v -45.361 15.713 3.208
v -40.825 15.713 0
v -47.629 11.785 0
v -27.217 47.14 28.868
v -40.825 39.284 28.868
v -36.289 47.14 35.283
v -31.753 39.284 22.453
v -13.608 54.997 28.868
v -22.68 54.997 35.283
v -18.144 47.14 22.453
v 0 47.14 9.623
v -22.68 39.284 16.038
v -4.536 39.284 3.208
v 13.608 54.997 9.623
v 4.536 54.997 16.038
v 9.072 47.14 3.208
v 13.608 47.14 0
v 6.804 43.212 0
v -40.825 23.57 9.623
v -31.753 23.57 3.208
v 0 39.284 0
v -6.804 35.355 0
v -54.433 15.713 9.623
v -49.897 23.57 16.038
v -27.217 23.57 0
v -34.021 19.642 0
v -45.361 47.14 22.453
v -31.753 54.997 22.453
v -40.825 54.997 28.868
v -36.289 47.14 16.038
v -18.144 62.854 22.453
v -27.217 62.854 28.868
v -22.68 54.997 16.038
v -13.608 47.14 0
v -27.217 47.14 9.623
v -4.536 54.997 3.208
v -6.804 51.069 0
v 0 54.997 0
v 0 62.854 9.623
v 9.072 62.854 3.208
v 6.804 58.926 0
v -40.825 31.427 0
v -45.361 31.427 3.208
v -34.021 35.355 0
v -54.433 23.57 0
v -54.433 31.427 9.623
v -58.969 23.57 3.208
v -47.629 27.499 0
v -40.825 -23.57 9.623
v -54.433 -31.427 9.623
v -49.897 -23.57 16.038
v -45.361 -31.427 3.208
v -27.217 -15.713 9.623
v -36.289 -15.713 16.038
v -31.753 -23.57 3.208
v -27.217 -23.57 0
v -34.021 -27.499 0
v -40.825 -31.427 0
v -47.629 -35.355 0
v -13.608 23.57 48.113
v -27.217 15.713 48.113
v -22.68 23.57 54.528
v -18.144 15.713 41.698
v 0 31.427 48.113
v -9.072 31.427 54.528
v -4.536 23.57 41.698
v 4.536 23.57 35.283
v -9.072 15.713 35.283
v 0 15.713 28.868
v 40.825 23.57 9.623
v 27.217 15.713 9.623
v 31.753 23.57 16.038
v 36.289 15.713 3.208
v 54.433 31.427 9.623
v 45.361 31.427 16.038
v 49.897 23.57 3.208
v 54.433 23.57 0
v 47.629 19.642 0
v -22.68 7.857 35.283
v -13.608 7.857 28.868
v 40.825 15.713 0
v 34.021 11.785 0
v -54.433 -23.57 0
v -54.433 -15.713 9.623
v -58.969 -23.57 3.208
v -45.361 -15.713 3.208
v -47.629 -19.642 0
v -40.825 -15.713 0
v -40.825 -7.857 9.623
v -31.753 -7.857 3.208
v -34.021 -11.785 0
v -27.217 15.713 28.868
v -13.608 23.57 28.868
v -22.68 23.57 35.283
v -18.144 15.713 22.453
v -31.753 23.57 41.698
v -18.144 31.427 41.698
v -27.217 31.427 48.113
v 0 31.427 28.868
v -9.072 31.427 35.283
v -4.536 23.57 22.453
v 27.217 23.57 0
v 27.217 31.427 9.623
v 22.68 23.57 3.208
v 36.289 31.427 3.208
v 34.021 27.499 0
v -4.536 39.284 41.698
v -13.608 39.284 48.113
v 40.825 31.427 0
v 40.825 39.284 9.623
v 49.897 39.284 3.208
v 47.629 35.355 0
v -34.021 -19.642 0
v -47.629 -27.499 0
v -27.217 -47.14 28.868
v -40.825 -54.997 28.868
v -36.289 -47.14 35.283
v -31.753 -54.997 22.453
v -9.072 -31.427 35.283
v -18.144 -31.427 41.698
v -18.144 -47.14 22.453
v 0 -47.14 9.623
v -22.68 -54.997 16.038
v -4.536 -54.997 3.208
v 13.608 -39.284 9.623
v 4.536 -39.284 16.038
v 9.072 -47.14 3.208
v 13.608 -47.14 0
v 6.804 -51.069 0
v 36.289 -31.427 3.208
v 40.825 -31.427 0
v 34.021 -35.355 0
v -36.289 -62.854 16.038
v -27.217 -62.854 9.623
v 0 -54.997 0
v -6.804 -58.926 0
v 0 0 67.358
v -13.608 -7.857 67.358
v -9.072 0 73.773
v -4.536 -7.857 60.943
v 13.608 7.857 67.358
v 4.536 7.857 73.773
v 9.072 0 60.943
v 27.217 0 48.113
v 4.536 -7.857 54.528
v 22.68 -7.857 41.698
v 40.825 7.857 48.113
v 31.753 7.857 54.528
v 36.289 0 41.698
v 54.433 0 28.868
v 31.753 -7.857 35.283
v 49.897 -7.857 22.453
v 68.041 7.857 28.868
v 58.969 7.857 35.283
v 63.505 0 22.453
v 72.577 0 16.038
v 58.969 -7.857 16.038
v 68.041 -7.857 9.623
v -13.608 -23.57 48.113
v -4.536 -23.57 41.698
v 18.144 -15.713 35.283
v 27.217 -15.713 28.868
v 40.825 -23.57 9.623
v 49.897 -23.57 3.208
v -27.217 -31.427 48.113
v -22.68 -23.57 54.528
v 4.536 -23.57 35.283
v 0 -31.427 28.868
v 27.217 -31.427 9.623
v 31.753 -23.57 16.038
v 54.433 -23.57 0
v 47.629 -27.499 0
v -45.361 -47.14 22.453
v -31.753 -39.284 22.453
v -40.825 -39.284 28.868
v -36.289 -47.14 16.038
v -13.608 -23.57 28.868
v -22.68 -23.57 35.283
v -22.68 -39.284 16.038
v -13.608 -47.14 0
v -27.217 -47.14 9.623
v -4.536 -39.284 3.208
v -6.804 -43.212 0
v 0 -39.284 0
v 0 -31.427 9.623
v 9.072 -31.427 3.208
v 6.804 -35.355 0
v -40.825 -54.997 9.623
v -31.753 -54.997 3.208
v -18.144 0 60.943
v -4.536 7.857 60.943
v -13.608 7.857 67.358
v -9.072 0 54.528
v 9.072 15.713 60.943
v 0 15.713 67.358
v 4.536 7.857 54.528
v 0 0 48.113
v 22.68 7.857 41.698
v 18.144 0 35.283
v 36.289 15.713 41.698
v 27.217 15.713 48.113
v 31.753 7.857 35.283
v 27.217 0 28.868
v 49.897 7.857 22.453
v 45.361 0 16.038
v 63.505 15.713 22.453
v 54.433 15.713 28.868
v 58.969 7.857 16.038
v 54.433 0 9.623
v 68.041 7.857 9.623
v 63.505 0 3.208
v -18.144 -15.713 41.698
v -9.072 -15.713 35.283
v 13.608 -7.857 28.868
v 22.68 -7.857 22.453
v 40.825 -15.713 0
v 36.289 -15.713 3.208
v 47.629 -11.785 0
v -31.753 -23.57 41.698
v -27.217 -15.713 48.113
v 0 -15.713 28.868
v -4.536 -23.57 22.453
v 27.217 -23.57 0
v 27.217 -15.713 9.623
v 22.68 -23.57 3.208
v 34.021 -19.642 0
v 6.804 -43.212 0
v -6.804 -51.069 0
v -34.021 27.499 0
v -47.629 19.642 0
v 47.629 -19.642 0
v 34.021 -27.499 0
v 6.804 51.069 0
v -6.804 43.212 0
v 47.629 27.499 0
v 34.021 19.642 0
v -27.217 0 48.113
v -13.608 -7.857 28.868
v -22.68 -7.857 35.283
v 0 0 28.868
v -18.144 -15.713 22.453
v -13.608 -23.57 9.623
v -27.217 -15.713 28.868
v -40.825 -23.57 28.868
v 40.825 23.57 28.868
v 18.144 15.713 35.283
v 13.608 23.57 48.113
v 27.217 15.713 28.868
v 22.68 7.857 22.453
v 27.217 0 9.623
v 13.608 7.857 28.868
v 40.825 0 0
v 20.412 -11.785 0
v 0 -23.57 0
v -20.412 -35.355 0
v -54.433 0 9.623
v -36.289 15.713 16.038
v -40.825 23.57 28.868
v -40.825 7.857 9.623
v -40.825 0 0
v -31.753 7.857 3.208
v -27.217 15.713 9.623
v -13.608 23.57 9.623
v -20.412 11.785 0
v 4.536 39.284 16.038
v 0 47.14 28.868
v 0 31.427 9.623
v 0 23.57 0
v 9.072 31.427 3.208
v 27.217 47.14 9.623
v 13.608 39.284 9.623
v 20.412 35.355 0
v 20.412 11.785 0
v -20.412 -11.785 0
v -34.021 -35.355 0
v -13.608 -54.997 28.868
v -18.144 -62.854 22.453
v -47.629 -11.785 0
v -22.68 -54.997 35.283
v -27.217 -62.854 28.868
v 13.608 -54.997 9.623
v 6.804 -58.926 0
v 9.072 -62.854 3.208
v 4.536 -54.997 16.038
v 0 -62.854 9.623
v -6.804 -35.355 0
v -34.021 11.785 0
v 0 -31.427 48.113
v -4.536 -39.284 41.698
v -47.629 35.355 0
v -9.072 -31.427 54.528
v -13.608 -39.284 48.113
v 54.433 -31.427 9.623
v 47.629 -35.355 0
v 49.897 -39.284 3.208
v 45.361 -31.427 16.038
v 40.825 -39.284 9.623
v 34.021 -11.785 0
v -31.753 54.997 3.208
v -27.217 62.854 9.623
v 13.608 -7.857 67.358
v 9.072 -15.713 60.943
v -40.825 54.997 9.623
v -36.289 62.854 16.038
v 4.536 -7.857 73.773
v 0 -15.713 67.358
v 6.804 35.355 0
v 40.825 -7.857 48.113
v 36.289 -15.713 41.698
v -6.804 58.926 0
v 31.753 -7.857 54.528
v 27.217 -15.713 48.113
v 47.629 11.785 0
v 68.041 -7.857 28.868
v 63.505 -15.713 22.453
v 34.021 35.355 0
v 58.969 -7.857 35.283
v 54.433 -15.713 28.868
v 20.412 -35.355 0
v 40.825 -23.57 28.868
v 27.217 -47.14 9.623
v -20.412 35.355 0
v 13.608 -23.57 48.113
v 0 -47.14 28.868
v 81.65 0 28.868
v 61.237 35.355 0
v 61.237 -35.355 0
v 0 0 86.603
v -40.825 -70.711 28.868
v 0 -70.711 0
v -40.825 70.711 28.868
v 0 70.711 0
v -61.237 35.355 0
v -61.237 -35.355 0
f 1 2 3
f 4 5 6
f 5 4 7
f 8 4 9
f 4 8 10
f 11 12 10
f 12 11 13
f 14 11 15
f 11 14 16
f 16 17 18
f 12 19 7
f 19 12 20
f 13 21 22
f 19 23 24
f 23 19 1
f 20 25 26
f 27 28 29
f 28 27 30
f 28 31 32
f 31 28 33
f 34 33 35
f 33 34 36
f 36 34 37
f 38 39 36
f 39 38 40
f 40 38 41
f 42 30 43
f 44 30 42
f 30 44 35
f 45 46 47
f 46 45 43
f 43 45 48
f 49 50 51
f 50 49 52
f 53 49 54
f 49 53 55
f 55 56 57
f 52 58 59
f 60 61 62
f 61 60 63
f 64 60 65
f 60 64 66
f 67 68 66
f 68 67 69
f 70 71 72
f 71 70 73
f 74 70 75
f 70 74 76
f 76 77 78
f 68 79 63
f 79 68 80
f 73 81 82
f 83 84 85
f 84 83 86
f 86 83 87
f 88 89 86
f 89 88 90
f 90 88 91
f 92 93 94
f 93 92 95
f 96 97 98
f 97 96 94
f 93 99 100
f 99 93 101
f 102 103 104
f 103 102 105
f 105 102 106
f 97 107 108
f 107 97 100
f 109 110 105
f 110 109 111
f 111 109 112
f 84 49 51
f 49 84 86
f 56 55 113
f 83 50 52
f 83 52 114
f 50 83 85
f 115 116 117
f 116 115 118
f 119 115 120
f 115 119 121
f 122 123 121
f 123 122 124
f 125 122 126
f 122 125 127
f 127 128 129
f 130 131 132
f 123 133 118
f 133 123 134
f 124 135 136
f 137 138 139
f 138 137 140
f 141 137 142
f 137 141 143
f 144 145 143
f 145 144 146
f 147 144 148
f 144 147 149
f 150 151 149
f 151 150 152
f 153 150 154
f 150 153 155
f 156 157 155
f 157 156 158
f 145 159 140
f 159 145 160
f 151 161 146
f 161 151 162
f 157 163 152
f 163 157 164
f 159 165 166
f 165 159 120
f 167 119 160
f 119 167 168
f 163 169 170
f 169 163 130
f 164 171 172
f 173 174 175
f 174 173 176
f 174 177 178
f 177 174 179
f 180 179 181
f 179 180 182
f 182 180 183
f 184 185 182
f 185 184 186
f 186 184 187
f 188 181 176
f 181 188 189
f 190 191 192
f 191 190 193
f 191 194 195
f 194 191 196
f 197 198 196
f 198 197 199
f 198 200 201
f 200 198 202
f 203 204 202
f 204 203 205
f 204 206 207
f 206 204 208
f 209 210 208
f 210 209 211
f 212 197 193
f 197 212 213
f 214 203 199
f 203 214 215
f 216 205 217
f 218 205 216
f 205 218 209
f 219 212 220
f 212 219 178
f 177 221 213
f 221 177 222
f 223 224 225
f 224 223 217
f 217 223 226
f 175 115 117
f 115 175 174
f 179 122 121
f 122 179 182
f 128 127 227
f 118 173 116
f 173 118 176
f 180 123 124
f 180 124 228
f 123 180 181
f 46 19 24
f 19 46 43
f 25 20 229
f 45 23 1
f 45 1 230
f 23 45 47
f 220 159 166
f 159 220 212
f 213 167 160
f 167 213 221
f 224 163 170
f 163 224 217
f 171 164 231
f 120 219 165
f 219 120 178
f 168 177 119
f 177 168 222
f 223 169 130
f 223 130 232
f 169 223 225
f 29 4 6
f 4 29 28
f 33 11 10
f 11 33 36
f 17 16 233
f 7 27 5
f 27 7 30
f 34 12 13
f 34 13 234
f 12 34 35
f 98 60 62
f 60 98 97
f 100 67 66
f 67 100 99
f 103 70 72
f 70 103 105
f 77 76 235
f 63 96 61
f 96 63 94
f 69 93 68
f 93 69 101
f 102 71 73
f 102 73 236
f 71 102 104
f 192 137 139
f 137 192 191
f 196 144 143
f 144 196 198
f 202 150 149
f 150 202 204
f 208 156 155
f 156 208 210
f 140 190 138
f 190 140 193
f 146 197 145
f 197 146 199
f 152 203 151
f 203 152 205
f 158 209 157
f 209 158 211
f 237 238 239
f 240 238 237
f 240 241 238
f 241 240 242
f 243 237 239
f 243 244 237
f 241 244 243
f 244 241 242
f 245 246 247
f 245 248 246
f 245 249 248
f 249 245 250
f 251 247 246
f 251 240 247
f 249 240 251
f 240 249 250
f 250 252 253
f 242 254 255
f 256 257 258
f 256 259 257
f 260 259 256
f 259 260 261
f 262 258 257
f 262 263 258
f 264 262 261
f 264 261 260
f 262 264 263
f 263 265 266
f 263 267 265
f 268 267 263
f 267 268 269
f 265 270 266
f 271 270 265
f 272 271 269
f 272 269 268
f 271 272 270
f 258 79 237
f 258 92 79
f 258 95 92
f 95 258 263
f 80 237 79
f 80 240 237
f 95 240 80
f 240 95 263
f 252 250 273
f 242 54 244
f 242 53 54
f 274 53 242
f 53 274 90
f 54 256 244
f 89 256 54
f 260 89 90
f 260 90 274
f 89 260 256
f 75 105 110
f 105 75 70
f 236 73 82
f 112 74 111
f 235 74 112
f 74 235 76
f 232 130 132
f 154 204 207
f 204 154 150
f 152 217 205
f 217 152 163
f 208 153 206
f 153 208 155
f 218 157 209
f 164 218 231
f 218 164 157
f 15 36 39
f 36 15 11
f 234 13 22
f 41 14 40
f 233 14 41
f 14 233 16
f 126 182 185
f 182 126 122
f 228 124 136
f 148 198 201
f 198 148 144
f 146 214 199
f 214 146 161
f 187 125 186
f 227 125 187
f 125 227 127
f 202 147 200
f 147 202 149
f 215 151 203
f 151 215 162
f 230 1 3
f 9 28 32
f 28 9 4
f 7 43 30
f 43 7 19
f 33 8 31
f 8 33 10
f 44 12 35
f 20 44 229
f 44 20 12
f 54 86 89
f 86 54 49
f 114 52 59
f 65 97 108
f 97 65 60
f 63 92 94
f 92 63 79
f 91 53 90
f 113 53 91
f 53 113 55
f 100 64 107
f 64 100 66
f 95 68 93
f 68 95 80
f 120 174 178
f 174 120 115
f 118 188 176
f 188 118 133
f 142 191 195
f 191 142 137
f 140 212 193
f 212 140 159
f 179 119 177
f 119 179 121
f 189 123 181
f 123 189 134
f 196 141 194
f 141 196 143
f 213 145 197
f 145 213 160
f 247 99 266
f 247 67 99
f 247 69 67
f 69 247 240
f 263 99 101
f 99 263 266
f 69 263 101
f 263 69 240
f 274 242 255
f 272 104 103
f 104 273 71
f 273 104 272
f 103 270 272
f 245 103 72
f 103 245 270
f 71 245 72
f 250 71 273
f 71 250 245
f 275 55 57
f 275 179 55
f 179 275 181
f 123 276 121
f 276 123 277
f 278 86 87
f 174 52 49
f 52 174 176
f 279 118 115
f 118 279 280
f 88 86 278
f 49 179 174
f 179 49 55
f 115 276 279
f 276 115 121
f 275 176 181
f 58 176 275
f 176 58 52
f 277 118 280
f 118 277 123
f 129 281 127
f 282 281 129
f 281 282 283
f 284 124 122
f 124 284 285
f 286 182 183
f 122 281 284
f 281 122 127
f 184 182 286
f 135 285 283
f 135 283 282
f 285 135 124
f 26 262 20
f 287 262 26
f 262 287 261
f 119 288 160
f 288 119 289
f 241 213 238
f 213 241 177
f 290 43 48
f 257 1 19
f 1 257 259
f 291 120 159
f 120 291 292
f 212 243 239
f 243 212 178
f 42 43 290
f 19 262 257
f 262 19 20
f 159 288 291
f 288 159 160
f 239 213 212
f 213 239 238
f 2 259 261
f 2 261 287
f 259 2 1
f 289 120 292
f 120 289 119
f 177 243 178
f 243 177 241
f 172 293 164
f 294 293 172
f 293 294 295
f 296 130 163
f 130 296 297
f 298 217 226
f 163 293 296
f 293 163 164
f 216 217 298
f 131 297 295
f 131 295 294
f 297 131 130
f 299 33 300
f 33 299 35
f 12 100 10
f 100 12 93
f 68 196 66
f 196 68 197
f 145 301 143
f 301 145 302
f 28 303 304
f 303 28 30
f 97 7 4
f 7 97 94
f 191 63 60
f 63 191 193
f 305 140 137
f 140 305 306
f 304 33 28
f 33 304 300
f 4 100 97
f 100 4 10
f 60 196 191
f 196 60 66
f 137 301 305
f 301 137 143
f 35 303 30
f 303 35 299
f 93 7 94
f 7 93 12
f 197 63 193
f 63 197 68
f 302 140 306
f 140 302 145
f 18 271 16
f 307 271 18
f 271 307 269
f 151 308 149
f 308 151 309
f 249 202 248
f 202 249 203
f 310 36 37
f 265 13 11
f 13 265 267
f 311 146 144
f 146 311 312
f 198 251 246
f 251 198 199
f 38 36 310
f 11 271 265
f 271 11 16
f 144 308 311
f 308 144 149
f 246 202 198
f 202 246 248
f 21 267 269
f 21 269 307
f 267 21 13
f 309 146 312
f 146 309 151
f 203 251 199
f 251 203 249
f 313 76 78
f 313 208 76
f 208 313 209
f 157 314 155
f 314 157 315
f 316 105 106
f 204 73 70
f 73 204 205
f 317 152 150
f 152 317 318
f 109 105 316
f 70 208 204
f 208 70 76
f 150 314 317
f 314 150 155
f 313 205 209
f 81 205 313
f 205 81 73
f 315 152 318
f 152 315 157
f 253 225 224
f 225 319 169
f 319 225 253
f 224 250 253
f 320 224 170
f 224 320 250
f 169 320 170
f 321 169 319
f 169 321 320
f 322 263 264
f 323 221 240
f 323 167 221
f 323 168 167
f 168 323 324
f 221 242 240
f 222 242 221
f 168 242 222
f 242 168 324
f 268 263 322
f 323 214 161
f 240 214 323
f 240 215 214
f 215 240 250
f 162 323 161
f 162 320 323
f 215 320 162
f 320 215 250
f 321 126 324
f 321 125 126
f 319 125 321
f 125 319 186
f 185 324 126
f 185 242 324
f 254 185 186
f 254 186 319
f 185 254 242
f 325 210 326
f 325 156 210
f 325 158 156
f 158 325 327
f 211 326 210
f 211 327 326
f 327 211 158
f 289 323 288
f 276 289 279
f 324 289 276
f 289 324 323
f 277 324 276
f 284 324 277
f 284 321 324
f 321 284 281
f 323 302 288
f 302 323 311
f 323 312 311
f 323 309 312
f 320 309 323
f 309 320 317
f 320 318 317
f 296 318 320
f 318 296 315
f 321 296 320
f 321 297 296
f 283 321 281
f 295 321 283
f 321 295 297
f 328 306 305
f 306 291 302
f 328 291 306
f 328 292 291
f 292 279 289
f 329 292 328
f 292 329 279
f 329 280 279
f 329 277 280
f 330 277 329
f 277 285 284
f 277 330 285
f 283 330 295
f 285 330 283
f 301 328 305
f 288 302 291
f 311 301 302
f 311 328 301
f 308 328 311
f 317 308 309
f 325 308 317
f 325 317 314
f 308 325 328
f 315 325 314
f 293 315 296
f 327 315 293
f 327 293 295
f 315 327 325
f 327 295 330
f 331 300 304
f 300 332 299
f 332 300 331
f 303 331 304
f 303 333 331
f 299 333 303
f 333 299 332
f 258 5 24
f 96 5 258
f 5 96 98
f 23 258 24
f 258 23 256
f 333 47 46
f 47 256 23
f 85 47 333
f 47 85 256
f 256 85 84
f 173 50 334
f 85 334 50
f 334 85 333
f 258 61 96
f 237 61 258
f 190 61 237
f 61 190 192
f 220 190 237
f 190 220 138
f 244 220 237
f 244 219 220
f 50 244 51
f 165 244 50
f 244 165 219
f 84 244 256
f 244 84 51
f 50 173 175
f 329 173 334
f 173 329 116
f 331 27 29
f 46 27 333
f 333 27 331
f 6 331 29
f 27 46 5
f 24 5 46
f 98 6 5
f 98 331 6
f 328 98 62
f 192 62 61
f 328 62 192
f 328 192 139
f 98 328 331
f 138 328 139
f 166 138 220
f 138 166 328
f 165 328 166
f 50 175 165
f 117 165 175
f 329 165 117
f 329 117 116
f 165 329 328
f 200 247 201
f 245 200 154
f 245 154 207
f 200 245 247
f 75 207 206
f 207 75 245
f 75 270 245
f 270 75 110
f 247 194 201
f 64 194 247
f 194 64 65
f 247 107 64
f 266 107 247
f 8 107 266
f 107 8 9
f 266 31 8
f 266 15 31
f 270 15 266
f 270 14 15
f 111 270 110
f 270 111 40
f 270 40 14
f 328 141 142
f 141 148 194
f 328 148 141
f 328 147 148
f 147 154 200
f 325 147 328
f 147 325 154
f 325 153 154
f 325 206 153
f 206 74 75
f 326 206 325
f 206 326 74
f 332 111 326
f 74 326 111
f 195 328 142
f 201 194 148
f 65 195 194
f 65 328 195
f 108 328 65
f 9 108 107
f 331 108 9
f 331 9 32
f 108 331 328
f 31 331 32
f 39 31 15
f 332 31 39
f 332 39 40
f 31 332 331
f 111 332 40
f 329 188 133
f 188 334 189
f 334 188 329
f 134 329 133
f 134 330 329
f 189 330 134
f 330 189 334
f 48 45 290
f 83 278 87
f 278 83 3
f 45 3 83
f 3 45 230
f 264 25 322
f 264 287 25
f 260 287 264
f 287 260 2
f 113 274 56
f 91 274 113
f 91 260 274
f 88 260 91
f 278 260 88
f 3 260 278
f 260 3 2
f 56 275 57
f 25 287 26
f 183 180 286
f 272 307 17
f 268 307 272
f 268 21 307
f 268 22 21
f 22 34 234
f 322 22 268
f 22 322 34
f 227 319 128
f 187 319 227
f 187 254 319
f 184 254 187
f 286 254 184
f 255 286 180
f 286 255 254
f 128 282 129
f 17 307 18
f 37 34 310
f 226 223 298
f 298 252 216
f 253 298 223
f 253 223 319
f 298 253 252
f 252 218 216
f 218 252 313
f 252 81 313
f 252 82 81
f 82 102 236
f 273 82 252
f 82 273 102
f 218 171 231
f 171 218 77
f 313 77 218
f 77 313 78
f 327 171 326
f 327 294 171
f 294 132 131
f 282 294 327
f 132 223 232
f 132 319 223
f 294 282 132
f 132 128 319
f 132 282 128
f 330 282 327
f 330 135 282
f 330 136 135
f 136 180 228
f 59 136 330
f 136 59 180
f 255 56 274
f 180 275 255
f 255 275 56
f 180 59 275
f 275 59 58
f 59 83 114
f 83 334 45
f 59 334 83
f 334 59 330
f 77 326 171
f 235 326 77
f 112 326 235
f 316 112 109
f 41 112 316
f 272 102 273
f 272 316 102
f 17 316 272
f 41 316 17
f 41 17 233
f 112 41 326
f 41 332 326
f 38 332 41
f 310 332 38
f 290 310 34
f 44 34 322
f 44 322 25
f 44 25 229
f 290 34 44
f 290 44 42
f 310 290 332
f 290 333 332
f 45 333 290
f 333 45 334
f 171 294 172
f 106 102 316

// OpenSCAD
// Menger Sponge
// By Nathan Hellweg, Emmett Lalish and Marius Kintel May 13, 2013
// CC-BY-SA license

// Size of edge of sponge
D=100;
// Fractal depth (number of iterations)
n=2;

echo(version=version());

module menger() {
  difference() {
    cube(D, center=true);
    for (v=[[0,0,0], [0,0,90], [0,90,0]])
      rotate(v) menger_negative(side=D, maxside=D, level=n);
  }
}

module menger_negative(side=1, maxside=1, level=1) {
  l=side/3;
  cube([maxside*1.1, l, l], center=true);
  if (level > 1) {
    for (i=[-1:1], j=[-1:1])
      if (i || j)
        translate([0, i*l, j*l])
          menger_negative(side=l, maxside=maxside, level=level-1);
  }
}

difference() {
  rotate([45, atan(1/sqrt(2)), 0]) menger();
  translate([0,0,-D]) cube(2*D, center=true);
}
